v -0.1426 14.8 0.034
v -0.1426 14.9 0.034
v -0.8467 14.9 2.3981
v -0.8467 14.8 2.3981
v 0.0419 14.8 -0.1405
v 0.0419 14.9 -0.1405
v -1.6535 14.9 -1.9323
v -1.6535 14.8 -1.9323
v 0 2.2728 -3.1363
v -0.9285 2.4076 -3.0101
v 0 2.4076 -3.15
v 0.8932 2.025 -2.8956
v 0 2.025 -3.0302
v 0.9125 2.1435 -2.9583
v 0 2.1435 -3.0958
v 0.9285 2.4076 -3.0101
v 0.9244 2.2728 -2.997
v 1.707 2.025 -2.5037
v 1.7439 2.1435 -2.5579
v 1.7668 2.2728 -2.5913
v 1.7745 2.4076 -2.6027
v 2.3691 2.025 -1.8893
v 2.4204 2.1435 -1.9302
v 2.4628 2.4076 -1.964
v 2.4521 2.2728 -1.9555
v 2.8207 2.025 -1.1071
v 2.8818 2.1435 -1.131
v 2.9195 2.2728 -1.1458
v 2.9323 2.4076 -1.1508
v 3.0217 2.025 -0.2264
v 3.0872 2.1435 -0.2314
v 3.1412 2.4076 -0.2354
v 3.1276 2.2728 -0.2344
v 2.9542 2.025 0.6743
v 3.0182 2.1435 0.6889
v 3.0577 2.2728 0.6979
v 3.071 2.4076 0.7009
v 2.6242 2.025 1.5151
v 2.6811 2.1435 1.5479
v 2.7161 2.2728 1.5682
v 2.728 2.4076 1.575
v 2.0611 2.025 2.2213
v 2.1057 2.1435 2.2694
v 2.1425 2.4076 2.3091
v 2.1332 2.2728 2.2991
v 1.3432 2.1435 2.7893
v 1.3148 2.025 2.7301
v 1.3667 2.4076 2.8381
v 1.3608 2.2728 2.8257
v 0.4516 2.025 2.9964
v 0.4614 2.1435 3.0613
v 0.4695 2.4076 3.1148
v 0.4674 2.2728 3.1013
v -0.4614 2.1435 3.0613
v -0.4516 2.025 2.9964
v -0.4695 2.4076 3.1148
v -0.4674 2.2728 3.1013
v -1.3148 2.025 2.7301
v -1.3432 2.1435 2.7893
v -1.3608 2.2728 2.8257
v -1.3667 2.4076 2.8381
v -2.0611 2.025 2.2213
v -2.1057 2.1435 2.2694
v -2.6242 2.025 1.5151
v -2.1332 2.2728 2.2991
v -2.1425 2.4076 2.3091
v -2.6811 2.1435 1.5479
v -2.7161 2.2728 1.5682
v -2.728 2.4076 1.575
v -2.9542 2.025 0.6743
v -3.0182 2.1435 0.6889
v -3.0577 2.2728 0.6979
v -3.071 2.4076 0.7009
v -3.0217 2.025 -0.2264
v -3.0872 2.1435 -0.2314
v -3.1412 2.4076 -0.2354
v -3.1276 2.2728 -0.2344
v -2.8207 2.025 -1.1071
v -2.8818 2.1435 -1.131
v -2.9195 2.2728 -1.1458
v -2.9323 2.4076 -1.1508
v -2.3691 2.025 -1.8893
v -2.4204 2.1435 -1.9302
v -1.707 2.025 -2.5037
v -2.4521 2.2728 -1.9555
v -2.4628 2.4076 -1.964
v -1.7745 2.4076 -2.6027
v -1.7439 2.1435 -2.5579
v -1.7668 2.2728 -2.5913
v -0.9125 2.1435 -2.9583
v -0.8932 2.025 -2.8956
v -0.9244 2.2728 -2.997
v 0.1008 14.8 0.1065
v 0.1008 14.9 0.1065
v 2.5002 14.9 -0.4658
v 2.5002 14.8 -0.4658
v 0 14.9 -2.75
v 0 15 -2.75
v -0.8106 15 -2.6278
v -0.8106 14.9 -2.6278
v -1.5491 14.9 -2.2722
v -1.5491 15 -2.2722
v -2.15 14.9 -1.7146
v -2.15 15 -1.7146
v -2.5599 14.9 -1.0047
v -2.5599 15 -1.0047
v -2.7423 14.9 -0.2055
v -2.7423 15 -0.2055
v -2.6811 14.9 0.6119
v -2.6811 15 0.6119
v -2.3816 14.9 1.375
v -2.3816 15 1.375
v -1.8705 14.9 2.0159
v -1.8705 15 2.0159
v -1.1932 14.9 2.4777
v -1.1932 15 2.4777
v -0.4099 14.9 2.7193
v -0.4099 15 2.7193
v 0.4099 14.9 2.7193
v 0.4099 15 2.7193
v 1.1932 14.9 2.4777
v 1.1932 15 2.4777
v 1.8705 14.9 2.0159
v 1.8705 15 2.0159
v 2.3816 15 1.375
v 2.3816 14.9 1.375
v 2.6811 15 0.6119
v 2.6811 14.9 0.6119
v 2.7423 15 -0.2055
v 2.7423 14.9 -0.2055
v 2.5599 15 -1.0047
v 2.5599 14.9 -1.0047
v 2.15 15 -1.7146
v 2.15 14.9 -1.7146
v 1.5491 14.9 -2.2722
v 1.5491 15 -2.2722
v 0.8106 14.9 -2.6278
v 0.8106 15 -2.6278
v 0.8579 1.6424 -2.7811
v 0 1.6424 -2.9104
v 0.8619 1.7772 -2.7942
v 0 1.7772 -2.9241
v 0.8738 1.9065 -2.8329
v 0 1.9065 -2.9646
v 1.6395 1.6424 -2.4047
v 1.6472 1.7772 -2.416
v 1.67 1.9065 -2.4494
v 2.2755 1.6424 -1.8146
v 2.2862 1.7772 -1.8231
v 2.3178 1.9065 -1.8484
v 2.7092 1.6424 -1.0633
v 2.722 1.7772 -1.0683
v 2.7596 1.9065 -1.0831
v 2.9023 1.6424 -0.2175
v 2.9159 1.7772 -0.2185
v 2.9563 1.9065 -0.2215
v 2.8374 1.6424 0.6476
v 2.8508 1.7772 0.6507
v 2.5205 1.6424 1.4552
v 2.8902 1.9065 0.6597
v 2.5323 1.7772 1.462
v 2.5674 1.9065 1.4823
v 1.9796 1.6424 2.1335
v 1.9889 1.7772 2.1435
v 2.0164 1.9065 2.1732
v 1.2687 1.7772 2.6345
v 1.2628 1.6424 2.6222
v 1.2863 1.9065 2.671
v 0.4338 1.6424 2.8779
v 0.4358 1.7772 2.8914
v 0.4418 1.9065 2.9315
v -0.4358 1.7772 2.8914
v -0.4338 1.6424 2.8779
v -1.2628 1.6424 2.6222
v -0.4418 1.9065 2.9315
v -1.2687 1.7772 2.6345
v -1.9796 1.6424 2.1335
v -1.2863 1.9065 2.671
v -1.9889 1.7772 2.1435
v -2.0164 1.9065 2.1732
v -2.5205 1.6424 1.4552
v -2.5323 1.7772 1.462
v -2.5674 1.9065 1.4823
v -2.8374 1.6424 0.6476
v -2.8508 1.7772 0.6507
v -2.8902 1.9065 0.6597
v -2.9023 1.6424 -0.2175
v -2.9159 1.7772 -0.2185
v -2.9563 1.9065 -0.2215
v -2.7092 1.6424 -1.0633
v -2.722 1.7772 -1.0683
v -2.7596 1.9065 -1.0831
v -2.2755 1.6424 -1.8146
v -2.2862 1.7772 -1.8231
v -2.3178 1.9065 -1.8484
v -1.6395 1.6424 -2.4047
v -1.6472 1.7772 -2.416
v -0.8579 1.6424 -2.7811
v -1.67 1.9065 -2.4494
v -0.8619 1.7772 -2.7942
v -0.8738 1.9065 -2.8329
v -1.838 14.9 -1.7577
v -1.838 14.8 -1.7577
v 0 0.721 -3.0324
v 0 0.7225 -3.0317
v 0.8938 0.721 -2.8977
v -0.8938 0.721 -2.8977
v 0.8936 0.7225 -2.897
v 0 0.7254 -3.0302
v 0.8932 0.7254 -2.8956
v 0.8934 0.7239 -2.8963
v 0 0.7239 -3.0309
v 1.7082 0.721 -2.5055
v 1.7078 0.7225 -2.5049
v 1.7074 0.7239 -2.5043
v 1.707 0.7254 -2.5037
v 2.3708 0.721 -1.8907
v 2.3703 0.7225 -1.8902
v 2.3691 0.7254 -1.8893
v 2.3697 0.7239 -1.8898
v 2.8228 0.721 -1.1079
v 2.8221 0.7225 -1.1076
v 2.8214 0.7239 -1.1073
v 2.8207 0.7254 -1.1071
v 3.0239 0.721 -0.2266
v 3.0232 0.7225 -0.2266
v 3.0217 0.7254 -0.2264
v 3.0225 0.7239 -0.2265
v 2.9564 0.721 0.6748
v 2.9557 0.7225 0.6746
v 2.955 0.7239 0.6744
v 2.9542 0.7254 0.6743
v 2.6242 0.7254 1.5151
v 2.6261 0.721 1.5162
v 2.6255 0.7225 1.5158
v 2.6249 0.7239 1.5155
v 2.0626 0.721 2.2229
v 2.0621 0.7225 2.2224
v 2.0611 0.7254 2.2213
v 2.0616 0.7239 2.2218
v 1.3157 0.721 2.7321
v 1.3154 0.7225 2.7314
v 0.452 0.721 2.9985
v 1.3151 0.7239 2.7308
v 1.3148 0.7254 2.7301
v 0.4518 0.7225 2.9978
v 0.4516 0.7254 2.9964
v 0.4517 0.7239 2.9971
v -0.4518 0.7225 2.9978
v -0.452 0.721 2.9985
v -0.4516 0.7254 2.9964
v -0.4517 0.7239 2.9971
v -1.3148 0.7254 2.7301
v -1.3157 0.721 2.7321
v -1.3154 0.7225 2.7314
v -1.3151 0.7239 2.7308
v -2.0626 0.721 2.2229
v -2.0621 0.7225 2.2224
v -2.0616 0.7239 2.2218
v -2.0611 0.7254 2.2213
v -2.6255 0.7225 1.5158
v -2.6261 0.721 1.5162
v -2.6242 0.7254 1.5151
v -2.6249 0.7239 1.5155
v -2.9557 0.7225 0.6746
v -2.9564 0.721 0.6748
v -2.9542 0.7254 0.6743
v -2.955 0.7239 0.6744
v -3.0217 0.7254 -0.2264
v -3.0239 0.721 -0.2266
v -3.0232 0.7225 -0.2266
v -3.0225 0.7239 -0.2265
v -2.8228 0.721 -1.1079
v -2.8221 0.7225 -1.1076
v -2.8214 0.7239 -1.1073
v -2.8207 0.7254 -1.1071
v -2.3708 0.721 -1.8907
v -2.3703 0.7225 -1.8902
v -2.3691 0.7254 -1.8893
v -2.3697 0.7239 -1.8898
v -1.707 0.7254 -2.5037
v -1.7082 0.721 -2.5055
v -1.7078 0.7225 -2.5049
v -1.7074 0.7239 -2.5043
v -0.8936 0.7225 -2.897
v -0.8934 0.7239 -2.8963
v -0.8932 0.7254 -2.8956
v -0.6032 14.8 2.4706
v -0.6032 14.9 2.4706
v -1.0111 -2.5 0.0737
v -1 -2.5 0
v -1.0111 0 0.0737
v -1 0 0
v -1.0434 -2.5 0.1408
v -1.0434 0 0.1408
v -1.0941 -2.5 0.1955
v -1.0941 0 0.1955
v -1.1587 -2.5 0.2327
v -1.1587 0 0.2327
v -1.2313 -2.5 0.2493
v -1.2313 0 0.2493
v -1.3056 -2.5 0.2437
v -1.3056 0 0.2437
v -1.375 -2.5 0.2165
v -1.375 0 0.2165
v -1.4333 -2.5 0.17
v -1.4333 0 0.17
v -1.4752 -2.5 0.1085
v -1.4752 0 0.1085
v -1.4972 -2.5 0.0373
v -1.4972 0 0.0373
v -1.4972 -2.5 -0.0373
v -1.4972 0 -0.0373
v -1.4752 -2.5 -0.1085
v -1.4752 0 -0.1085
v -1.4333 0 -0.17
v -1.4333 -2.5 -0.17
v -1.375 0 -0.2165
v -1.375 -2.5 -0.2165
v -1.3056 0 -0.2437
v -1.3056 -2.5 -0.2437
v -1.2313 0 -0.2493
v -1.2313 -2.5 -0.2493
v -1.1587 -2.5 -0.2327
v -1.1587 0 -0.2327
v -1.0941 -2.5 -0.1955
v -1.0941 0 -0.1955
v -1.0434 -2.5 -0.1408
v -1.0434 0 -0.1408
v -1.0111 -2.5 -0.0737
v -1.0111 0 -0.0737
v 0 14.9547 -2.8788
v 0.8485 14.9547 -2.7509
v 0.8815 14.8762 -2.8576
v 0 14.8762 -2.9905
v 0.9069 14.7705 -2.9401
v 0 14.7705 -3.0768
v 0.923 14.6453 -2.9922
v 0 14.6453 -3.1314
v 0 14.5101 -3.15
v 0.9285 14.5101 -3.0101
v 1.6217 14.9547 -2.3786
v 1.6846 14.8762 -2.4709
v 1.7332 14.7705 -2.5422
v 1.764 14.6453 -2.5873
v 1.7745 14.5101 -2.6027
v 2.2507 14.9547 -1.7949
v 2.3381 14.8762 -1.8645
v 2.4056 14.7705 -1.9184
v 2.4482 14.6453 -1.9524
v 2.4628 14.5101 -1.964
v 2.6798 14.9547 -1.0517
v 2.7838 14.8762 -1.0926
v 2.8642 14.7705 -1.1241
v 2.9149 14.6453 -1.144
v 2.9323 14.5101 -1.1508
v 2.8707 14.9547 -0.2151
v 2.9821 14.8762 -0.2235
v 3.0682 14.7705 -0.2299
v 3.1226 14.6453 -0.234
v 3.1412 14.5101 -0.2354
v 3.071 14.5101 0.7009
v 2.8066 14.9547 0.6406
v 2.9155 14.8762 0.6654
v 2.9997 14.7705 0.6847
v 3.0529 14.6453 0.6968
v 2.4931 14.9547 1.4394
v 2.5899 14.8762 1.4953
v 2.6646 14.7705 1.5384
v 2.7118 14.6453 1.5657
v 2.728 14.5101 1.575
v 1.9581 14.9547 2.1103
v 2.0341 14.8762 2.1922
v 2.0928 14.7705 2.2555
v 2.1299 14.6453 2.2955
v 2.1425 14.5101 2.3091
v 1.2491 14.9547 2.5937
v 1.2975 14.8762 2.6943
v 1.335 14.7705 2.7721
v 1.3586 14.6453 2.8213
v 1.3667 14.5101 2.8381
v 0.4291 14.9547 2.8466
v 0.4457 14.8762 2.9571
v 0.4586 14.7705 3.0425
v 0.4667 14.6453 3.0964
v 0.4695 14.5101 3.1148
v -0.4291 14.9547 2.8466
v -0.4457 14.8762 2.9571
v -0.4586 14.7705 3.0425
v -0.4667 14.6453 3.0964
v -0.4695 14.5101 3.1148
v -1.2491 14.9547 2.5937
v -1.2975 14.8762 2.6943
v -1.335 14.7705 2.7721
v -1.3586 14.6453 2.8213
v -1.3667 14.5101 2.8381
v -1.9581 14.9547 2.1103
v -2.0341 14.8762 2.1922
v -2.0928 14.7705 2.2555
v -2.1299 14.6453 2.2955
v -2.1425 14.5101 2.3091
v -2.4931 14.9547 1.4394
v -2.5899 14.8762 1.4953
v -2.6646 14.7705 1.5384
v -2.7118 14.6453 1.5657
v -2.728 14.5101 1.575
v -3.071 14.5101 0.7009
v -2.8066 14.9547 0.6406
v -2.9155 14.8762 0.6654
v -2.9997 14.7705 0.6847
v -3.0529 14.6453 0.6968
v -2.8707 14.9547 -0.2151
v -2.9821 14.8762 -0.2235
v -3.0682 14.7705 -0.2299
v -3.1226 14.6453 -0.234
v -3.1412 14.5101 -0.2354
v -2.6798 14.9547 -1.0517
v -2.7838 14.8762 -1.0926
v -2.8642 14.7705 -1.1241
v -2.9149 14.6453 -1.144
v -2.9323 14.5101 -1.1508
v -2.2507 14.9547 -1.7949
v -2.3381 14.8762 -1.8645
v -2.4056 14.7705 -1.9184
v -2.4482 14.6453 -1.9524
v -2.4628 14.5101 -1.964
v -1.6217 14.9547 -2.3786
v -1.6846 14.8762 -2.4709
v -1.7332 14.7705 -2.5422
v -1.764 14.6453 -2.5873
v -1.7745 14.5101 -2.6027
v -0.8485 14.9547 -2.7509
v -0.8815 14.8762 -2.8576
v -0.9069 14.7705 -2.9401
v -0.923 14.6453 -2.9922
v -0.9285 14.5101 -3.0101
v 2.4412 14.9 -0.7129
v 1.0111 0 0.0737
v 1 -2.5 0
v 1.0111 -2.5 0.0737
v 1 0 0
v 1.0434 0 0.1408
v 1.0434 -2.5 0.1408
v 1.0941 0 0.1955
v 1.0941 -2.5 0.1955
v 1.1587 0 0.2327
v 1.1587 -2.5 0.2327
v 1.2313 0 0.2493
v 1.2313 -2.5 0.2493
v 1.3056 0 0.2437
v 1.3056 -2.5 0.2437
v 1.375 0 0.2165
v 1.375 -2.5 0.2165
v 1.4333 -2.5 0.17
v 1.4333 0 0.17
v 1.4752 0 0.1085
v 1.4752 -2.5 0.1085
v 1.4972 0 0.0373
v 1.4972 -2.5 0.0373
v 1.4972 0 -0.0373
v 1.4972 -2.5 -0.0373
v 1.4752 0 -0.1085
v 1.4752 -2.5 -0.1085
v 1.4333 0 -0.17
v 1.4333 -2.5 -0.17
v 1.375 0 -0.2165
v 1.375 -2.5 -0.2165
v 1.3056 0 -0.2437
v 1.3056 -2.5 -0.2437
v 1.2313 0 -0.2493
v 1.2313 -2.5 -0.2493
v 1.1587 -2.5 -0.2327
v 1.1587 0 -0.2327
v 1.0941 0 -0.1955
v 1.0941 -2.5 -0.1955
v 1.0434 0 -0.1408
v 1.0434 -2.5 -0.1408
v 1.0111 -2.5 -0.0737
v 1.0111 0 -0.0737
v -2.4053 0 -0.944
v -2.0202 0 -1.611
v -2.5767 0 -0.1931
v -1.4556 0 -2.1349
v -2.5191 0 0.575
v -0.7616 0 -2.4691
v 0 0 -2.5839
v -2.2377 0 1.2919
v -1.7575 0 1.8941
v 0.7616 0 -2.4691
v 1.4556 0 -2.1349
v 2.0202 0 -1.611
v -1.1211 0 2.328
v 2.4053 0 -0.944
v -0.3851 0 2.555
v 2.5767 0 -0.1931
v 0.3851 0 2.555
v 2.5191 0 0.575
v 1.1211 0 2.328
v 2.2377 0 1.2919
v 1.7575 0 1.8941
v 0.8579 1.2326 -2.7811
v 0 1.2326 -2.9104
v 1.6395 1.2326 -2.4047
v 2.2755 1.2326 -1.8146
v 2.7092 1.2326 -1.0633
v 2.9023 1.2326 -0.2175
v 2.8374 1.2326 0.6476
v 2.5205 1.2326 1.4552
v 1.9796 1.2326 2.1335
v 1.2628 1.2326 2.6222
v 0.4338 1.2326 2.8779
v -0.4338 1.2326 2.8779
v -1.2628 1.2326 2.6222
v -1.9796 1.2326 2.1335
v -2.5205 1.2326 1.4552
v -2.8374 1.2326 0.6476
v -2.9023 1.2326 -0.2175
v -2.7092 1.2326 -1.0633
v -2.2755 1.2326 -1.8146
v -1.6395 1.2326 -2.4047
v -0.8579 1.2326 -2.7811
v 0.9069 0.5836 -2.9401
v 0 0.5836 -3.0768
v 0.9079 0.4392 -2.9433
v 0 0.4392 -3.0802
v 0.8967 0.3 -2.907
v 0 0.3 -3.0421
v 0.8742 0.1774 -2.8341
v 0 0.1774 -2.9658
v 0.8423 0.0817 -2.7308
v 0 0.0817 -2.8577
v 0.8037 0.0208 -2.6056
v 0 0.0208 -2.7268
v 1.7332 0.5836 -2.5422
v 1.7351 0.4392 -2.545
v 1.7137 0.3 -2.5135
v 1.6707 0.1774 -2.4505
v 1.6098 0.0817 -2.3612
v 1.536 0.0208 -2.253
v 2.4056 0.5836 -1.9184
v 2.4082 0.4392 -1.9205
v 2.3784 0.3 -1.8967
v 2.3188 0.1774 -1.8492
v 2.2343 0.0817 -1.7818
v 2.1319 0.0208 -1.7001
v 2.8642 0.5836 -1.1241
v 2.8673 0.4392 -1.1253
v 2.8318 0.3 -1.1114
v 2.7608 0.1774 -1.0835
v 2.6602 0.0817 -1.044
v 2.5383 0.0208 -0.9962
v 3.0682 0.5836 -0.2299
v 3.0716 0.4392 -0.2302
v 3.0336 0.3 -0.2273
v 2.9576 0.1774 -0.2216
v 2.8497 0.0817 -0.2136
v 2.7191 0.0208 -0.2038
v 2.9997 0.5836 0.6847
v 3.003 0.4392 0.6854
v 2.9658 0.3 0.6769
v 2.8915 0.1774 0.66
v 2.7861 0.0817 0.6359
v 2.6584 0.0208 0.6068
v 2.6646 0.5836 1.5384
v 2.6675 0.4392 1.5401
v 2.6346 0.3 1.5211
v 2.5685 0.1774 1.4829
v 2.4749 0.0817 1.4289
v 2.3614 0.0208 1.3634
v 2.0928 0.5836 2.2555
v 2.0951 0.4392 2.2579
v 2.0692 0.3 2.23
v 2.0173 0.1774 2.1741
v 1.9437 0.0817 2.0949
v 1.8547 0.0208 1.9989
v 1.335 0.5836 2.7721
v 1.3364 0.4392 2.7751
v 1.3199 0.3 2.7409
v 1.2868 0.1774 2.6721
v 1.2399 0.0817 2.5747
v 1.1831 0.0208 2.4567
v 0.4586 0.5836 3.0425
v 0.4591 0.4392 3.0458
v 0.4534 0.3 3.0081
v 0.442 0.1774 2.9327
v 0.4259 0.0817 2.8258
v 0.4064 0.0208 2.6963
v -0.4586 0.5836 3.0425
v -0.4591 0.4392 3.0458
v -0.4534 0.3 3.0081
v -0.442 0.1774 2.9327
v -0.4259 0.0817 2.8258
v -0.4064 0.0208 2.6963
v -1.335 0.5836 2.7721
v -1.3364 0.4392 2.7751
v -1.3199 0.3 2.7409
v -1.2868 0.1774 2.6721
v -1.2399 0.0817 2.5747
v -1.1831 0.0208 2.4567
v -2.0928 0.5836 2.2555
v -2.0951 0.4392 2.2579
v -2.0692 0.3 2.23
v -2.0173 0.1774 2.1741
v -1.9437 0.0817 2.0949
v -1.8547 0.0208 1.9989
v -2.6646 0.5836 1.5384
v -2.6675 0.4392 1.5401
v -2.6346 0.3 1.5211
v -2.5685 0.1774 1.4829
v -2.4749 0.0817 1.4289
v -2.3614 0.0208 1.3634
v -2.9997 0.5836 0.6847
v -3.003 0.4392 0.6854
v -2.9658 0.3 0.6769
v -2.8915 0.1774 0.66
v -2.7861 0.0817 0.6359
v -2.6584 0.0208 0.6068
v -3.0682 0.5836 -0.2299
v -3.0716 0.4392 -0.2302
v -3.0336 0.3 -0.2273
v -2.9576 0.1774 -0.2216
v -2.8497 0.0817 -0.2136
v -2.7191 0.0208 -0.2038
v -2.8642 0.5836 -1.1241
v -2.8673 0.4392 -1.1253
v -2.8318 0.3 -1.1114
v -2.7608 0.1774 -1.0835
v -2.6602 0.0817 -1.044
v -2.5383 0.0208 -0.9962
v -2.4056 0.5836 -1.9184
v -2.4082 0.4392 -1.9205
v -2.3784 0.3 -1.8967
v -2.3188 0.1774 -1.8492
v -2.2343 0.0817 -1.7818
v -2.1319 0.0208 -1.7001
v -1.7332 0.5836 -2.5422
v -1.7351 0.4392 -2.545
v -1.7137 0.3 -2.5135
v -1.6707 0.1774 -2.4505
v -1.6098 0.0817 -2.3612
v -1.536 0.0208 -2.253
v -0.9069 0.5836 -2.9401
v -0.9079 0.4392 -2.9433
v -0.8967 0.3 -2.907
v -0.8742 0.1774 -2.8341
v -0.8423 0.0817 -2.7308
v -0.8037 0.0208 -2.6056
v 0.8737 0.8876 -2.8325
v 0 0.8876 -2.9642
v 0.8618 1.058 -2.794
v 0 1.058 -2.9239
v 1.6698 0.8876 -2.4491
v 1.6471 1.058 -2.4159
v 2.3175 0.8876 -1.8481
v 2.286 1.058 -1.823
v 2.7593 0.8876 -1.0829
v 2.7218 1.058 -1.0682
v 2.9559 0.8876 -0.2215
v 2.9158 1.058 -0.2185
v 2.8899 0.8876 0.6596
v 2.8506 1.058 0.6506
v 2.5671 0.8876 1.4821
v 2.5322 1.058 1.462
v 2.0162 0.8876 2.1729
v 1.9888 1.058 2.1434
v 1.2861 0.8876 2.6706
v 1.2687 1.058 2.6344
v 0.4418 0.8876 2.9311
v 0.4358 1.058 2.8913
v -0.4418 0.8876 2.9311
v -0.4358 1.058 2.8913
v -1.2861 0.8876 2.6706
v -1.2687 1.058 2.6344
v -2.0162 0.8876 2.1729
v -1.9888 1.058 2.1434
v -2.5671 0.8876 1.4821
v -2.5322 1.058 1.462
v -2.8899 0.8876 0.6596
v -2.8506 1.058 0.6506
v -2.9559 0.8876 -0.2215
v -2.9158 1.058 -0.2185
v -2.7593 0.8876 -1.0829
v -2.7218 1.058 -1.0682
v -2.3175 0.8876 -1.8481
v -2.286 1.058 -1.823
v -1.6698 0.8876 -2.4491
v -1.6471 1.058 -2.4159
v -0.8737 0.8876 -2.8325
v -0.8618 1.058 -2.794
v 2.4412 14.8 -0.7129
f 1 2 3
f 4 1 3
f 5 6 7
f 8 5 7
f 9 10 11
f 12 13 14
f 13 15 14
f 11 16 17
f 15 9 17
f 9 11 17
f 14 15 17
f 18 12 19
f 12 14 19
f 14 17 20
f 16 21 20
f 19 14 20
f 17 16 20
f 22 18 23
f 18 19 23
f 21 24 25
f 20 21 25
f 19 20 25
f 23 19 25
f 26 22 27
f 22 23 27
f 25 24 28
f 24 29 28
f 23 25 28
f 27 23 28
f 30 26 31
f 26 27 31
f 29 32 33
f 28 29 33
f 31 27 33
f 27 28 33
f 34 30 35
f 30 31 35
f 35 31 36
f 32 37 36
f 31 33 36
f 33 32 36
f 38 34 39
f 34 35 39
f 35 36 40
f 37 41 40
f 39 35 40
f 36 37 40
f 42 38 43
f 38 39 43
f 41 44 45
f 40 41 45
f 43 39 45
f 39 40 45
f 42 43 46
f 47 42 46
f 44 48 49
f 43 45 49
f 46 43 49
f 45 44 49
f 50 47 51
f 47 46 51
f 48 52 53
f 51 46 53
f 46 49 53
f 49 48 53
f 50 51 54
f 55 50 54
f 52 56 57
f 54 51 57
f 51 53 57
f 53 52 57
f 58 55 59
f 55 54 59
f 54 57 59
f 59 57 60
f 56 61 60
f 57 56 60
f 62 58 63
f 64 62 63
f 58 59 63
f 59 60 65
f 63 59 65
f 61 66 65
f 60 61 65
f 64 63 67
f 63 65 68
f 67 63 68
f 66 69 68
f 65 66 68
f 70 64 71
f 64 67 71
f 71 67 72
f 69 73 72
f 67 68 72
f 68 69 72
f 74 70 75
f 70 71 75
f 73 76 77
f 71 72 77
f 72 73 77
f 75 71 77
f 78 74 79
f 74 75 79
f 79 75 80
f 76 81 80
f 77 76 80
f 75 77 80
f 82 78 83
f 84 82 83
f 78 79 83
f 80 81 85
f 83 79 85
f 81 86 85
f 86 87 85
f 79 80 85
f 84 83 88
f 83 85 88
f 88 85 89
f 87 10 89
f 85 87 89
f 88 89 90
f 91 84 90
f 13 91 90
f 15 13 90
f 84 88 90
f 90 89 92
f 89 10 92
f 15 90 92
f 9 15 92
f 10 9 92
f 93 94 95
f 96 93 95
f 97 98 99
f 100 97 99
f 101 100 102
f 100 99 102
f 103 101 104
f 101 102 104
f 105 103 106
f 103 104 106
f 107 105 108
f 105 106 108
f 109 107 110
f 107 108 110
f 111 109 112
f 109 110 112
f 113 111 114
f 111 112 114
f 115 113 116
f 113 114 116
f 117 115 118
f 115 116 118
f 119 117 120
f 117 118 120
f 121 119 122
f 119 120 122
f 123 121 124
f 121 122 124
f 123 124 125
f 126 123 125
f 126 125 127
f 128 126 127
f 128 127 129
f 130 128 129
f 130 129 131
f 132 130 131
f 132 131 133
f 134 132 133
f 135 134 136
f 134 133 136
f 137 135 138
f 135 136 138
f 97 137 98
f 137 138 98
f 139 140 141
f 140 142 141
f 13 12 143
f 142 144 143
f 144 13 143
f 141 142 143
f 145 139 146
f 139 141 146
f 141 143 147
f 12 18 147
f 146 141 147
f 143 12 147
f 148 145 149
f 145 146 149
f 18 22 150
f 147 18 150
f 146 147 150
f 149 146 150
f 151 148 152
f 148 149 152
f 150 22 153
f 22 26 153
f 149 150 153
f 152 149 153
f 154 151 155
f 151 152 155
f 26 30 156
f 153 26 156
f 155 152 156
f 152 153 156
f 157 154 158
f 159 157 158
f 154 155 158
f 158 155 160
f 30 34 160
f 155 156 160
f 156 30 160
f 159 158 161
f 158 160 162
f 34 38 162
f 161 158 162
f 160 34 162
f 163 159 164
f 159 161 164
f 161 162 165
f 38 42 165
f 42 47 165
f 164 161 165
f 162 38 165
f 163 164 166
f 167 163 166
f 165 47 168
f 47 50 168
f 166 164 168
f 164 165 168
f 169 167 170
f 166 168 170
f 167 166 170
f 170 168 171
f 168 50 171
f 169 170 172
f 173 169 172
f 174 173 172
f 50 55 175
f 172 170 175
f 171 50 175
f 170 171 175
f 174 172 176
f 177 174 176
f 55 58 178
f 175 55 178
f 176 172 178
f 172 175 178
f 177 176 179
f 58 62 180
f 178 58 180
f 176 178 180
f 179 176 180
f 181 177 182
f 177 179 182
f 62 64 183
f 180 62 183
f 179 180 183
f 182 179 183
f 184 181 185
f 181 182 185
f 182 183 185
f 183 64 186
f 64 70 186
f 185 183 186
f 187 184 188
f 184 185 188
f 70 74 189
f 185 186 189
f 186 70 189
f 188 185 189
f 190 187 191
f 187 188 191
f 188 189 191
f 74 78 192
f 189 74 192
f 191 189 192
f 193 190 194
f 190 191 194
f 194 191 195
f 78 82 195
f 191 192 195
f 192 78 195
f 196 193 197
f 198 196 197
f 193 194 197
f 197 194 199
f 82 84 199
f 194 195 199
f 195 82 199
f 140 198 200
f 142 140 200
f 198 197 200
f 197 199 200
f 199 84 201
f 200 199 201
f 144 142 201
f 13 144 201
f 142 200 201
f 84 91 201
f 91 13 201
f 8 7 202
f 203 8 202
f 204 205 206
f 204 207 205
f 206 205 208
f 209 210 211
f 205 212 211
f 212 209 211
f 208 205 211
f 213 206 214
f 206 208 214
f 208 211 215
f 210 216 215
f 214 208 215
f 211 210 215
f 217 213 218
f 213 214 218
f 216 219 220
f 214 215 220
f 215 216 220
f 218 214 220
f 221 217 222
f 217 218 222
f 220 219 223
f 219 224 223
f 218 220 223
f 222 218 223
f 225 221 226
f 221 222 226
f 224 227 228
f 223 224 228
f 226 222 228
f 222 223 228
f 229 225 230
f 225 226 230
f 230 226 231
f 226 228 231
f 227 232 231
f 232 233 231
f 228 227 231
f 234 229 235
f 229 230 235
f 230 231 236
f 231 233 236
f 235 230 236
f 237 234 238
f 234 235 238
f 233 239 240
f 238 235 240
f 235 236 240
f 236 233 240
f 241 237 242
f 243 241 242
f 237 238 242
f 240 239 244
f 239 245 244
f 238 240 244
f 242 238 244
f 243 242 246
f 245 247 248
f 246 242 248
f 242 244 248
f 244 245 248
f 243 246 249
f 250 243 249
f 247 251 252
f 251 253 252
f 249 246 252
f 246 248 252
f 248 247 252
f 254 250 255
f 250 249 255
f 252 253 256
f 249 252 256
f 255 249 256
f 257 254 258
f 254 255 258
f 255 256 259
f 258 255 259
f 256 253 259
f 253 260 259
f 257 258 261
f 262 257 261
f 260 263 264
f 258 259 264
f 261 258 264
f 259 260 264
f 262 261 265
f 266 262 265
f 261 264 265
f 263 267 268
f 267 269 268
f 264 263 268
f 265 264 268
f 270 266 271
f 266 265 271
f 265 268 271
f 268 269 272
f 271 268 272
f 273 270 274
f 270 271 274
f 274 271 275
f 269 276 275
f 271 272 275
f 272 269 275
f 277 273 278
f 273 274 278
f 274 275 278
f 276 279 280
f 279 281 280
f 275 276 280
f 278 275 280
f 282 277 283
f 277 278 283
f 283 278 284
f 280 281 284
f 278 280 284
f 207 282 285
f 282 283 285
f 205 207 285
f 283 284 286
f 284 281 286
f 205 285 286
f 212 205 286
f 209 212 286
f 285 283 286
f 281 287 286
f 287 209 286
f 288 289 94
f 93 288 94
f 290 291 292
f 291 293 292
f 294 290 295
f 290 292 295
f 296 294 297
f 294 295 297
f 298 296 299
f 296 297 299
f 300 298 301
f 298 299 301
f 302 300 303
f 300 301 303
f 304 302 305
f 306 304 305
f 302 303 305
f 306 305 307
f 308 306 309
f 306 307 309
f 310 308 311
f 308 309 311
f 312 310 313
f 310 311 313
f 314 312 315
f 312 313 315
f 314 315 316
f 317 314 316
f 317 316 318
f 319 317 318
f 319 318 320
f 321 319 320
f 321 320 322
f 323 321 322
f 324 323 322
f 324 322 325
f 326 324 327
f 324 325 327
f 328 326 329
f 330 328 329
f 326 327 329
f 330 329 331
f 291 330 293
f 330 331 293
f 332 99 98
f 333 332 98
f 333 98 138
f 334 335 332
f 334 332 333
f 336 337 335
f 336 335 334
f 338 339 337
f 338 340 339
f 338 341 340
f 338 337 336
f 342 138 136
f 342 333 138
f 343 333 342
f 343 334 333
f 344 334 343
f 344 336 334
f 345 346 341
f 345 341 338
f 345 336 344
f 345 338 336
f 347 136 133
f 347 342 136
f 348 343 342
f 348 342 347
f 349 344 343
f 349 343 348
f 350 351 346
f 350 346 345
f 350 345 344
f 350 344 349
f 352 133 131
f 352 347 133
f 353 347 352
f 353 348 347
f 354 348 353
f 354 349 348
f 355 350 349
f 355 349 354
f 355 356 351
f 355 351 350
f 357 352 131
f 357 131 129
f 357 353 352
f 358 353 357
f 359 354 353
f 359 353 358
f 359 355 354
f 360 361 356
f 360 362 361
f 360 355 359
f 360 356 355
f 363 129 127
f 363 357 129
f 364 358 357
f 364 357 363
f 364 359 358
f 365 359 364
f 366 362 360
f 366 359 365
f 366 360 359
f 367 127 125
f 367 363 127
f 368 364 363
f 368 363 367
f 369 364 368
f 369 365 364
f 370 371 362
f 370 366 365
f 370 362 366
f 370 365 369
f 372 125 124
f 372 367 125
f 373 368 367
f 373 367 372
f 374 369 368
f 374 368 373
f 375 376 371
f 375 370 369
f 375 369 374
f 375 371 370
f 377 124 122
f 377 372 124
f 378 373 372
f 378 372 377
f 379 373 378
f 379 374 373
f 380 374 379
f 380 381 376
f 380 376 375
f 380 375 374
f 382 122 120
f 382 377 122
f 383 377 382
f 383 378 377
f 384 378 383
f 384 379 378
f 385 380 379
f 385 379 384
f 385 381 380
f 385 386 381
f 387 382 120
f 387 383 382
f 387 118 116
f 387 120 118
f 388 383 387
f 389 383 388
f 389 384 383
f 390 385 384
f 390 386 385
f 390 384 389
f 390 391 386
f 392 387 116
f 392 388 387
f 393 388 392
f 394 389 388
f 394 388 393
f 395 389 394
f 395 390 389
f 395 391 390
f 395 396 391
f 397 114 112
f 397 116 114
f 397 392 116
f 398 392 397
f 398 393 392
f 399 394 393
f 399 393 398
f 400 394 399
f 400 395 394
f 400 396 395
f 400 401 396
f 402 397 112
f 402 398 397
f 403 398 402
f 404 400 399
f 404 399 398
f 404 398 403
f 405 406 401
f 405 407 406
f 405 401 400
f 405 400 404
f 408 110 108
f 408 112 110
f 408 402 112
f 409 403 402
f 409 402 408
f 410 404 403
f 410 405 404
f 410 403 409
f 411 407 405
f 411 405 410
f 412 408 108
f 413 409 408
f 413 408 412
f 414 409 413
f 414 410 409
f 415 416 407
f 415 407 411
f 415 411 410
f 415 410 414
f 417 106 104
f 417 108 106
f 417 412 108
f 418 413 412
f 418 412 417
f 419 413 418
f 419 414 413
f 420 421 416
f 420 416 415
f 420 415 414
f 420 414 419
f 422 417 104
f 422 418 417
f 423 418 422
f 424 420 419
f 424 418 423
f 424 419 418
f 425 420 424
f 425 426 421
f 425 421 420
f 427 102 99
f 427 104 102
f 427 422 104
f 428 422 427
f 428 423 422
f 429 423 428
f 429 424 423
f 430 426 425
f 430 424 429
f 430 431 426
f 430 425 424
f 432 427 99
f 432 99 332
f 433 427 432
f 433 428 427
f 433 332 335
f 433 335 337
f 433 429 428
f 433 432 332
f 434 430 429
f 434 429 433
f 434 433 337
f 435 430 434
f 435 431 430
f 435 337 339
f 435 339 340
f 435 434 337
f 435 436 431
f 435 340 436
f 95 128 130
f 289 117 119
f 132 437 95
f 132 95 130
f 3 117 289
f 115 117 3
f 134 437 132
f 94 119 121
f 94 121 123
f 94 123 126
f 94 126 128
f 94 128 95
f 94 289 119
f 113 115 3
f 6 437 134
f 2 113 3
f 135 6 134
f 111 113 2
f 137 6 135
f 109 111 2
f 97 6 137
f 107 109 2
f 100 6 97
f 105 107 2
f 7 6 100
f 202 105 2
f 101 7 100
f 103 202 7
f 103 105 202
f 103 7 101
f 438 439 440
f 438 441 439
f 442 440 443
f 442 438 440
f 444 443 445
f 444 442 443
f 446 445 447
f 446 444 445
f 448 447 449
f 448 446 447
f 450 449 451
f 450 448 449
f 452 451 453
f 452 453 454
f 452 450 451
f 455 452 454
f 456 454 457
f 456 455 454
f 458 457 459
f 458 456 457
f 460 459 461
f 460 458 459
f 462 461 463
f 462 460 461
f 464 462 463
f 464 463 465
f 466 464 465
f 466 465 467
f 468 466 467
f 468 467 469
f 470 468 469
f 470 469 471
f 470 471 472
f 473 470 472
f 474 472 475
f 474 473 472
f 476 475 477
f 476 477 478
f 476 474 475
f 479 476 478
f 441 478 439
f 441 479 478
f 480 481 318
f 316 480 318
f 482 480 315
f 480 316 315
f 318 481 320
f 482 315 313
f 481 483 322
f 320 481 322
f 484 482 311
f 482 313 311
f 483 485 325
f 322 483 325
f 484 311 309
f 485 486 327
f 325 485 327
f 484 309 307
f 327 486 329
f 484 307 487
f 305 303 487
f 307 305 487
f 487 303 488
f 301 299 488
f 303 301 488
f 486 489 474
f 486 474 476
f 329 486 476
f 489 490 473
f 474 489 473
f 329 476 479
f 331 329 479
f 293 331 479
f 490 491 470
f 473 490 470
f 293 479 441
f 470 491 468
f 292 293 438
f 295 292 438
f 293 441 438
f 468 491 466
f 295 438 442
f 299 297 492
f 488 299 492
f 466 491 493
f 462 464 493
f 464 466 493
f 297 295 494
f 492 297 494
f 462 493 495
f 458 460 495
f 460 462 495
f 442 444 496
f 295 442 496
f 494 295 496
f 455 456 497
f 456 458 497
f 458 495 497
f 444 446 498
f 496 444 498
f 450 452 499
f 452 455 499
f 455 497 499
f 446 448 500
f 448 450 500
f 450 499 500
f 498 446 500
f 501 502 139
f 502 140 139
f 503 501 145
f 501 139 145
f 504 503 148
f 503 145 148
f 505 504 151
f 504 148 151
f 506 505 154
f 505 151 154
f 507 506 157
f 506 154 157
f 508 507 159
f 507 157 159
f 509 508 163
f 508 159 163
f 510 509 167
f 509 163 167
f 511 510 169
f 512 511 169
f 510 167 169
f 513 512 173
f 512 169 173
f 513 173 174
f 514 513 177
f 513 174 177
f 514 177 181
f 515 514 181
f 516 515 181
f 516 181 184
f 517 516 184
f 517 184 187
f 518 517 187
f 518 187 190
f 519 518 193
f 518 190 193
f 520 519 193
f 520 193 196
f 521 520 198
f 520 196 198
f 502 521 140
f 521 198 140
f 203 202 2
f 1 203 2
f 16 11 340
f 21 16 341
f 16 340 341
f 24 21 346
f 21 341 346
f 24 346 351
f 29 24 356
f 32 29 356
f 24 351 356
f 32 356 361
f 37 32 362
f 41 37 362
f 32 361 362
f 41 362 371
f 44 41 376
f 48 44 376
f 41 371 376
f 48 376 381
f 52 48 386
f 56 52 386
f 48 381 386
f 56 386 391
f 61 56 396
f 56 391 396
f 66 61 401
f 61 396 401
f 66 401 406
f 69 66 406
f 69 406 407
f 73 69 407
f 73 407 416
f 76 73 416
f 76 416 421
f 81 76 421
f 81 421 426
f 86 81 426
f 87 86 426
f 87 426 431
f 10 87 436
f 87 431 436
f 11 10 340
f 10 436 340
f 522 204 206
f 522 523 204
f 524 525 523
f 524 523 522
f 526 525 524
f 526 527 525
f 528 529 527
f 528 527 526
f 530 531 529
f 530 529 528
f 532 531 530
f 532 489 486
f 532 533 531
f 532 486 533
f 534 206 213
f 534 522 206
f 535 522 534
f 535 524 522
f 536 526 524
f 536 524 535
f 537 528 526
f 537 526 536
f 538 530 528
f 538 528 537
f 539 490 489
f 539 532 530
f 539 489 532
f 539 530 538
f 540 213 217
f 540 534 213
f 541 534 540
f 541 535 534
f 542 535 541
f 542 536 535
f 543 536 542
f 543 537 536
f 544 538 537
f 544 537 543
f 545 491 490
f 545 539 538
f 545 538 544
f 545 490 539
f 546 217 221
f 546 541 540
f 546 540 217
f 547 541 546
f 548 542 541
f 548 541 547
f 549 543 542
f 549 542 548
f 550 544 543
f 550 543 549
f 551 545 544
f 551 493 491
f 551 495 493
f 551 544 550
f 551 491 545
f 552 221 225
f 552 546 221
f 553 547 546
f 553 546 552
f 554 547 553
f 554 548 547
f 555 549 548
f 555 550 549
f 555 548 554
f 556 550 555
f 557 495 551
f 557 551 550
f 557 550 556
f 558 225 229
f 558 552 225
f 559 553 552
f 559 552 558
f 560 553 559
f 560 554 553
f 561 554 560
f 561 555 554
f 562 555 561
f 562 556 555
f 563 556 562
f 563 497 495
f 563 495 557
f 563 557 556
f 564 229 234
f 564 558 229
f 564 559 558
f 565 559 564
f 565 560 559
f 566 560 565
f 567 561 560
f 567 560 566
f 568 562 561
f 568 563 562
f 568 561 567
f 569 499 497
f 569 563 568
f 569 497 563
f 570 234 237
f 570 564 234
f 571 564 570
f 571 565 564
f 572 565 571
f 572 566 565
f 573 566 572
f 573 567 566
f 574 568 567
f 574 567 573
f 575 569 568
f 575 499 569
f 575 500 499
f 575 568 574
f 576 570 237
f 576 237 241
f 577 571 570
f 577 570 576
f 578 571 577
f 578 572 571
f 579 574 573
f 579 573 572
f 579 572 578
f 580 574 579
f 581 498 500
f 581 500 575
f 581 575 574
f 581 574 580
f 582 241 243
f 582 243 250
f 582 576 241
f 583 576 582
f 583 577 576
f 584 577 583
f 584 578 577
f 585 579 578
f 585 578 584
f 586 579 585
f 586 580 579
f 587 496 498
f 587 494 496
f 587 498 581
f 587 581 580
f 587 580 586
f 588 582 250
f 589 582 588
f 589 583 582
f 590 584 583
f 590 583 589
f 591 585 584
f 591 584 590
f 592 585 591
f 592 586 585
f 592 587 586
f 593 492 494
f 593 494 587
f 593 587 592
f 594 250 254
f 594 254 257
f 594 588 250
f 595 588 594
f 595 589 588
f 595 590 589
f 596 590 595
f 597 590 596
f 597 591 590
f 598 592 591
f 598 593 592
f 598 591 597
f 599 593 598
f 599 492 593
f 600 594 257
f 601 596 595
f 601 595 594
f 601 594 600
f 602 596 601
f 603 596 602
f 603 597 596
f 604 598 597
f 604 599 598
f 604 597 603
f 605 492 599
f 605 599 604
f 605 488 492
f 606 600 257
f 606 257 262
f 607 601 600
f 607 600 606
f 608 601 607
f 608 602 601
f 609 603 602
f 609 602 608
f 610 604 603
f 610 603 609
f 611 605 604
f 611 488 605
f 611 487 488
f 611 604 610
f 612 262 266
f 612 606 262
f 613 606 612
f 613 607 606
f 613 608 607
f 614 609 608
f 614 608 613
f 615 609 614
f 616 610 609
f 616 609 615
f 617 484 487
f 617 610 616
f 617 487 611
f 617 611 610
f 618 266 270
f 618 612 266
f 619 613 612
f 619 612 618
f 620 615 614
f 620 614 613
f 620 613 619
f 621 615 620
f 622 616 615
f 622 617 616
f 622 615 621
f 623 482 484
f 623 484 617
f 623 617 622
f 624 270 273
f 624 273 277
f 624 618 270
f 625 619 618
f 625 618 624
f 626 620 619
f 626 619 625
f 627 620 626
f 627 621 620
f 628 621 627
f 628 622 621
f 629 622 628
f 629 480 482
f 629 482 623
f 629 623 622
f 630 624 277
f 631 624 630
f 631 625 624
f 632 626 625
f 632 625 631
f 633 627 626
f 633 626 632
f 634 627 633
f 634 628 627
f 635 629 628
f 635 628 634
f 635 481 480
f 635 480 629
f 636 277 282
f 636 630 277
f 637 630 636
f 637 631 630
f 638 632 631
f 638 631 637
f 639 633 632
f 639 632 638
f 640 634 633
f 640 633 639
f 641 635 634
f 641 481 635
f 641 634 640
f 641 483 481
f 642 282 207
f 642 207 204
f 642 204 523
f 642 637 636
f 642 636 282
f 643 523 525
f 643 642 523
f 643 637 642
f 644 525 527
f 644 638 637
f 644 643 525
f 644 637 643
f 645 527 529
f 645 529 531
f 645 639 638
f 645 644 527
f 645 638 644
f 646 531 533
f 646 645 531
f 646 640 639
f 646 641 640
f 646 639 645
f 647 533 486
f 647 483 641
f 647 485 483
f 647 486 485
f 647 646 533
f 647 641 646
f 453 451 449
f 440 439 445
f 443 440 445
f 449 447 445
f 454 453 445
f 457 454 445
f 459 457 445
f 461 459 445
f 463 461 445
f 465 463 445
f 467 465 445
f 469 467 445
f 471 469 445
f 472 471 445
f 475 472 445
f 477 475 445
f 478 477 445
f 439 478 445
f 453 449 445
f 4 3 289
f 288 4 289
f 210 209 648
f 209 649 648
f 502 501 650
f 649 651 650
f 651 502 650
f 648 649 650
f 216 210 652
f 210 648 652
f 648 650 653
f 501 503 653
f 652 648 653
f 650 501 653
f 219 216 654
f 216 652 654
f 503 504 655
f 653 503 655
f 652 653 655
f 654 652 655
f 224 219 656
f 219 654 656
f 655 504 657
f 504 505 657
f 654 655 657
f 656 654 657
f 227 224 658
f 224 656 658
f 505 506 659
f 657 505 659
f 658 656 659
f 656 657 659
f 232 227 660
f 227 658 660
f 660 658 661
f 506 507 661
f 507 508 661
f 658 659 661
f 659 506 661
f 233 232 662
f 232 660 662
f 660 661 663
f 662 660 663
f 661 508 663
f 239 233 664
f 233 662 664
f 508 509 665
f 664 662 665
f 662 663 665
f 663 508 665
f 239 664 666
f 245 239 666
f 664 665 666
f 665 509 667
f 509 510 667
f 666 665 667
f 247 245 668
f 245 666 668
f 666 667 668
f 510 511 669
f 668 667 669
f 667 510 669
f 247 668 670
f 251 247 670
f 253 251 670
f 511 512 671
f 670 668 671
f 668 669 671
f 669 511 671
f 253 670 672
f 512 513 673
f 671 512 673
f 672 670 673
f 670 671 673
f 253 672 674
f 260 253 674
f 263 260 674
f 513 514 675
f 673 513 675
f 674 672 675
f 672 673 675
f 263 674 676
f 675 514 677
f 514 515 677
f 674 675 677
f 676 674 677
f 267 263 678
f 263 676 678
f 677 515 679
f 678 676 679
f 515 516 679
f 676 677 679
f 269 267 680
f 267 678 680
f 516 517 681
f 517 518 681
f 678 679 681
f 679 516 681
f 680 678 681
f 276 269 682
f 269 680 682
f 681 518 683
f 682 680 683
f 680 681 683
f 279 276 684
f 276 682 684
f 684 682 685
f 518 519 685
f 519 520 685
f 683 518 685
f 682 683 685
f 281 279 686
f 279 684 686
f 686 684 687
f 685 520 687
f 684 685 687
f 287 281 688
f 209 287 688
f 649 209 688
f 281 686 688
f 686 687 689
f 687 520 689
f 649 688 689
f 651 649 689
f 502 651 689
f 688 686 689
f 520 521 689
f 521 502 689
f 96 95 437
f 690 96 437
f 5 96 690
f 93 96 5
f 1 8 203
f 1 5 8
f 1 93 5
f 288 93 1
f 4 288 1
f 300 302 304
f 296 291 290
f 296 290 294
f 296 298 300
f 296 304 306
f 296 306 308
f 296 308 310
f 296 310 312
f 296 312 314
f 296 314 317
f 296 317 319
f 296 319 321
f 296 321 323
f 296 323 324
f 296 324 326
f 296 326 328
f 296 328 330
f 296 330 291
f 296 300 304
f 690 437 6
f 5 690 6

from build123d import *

# Parameters (mm, degrees)
SKETCH2_R          = 2.75
CUT_EXTRUDE1_DEPTH = 0.1
CUT_EXTRUDE2_DEPTH = 0.1
FILLET1_R          = 0.5
SKETCH4_W          = 0.25
SKETCH4_H          = 2.5


with BuildPart() as part:
    # Sketch1 → Revolve1 (revolve)
    with BuildSketch(Plane.XY, mode=Mode.PRIVATE) as revolve1_sk:
        with BuildLine():
            Line((3.15, 15), (0, 15))
            Line((0, 15), (0, 0))
            Line((0, 0), (3.030208333, 0))
            ThreePointArc((3.030208333, 0), (3.115870139, 0.362697063), (3.030208333, 0.725394126))
            ThreePointArc((3.030208333, 0.725394126), (2.940770958, 0.972019442), (2.910416667, 1.232599004))
            Line((2.910416667, 1.232599004), (2.910416667, 1.642400996))
            ThreePointArc((2.910416667, 1.642400996), (2.941064683, 1.842850794), (3.030208333, 2.024984899))
            ThreePointArc((3.030208333, 2.024984899), (3.119351983, 2.207119004), (3.15, 2.407568802))
            Line((3.15, 2.407568802), (3.15, 15))
        make_face()
    revolve(revolve1_sk.sketch.rotate(Axis((0, 15, 0), (0, -1, 0)), 270), axis=Axis((0, 15, 0), (0, -1, 0)))

    # Sketch2 → Cut-Extrude1 (cut)
    with BuildSketch(Plane(origin=(0, 15, 0), x_dir=(-1, 0, 0), z_dir=(0, 1, 0))):
        with Locations(Location((0, 0, 0), (0, 0, 270))):
            Circle(SKETCH2_R)
    extrude(amount=-CUT_EXTRUDE1_DEPTH, mode=Mode.SUBTRACT)

    # Sketch3 → Cut-Extrude2 (cut)
    with BuildSketch(Plane(origin=(0, 14.9, 0), x_dir=(-1, 0, 0), z_dir=(0, 1, 0))):
        Polygon((1.653472744, -1.932293167), (1.837973446, -1.757720858), (0.142645036, 0.03402539), (0.846678598, 2.398095985), (0.603244193, 2.470592124), (-0.10078937, 0.10652153), (-2.500151342, -0.465802817), (-2.441217638, -0.712871266), (-0.041855666, -0.14054692), align=None)
    extrude(amount=-CUT_EXTRUDE2_DEPTH, mode=Mode.SUBTRACT)

    # Fillet1
    # the kernel refuses this fillet: 0.5 mm, written as the material it takes off along each edge
    with BuildSketch(Plane(origin=(0, 15, 0), x_dir=(0, 0, -1), z_dir=(-1, 0, 0))) as fillet1_piece_1:
        with BuildLine():
            CenterArc((2.65, 0.489897949), FILLET1_R, 281.536959033, 78.463040967)
            Line((3.15, 0.489897949), (3.16, 0.489897949))
            Line((3.16, 0.489897949), (3.16, 0))
            Line((3.16, 0), (3.15, -0.01))
            ThreePointArc((3.15, -0.01), (2.95, -0.01), (2.752, -0.009797959))
            Line((2.752, -0.009797959), (2.75, 0))
        make_face()
    revolve(axis=Axis((0, 15, 0), (0, -1, 0)), mode=Mode.SUBTRACT)
    with BuildSketch(Plane(origin=(0, 0, 0), x_dir=(0, 0, -1), z_dir=(-1, 0, 0))) as fillet1_piece_2:
        with BuildLine():
            CenterArc((2.583882439, -0.5), FILLET1_R, 333.771257748, 116.228742252)
            Line((2.583882439, 0), (2.583882439, 0.01))
            Line((2.583882439, 0.01), (3.030208333, 0.01))
            Line((3.030208333, 0.01), (3.039151656, 0.004474035))
            ThreePointArc((3.039151656, 0.004474035), (3.125866344, -0.360201414), (3.041371195, -0.725397511))
            Line((3.041371195, -0.725397511), (3.032400827, -0.720977952))
        make_face()
    revolve(axis=Axis((0, 0, 0), (0, -1, 0)), mode=Mode.SUBTRACT)

    # Sketch4 → Revolve2 (revolve)
    with BuildSketch(Plane(origin=(0, 0, 0), x_dir=(-1, 0, 0), z_dir=(0, 0, -1)), mode=Mode.PRIVATE) as revolve2_sk:
        with Locations((-1.375, -1.25)):
            Rectangle(SKETCH4_W, SKETCH4_H)
    revolve2 = revolve(revolve2_sk.sketch.rotate(Axis((1.25, -2.5, 0), (0, 1, 0)), 180), axis=Axis((1.25, -2.5, 0), (0, 1, 0)))

    # Simetría2: Revolve2 across plane
    add(revolve2.mirror(Plane(origin=(0, 0, 0), x_dir=(0, 0, 1), z_dir=(1, 0, 0))))


solid = part.part
